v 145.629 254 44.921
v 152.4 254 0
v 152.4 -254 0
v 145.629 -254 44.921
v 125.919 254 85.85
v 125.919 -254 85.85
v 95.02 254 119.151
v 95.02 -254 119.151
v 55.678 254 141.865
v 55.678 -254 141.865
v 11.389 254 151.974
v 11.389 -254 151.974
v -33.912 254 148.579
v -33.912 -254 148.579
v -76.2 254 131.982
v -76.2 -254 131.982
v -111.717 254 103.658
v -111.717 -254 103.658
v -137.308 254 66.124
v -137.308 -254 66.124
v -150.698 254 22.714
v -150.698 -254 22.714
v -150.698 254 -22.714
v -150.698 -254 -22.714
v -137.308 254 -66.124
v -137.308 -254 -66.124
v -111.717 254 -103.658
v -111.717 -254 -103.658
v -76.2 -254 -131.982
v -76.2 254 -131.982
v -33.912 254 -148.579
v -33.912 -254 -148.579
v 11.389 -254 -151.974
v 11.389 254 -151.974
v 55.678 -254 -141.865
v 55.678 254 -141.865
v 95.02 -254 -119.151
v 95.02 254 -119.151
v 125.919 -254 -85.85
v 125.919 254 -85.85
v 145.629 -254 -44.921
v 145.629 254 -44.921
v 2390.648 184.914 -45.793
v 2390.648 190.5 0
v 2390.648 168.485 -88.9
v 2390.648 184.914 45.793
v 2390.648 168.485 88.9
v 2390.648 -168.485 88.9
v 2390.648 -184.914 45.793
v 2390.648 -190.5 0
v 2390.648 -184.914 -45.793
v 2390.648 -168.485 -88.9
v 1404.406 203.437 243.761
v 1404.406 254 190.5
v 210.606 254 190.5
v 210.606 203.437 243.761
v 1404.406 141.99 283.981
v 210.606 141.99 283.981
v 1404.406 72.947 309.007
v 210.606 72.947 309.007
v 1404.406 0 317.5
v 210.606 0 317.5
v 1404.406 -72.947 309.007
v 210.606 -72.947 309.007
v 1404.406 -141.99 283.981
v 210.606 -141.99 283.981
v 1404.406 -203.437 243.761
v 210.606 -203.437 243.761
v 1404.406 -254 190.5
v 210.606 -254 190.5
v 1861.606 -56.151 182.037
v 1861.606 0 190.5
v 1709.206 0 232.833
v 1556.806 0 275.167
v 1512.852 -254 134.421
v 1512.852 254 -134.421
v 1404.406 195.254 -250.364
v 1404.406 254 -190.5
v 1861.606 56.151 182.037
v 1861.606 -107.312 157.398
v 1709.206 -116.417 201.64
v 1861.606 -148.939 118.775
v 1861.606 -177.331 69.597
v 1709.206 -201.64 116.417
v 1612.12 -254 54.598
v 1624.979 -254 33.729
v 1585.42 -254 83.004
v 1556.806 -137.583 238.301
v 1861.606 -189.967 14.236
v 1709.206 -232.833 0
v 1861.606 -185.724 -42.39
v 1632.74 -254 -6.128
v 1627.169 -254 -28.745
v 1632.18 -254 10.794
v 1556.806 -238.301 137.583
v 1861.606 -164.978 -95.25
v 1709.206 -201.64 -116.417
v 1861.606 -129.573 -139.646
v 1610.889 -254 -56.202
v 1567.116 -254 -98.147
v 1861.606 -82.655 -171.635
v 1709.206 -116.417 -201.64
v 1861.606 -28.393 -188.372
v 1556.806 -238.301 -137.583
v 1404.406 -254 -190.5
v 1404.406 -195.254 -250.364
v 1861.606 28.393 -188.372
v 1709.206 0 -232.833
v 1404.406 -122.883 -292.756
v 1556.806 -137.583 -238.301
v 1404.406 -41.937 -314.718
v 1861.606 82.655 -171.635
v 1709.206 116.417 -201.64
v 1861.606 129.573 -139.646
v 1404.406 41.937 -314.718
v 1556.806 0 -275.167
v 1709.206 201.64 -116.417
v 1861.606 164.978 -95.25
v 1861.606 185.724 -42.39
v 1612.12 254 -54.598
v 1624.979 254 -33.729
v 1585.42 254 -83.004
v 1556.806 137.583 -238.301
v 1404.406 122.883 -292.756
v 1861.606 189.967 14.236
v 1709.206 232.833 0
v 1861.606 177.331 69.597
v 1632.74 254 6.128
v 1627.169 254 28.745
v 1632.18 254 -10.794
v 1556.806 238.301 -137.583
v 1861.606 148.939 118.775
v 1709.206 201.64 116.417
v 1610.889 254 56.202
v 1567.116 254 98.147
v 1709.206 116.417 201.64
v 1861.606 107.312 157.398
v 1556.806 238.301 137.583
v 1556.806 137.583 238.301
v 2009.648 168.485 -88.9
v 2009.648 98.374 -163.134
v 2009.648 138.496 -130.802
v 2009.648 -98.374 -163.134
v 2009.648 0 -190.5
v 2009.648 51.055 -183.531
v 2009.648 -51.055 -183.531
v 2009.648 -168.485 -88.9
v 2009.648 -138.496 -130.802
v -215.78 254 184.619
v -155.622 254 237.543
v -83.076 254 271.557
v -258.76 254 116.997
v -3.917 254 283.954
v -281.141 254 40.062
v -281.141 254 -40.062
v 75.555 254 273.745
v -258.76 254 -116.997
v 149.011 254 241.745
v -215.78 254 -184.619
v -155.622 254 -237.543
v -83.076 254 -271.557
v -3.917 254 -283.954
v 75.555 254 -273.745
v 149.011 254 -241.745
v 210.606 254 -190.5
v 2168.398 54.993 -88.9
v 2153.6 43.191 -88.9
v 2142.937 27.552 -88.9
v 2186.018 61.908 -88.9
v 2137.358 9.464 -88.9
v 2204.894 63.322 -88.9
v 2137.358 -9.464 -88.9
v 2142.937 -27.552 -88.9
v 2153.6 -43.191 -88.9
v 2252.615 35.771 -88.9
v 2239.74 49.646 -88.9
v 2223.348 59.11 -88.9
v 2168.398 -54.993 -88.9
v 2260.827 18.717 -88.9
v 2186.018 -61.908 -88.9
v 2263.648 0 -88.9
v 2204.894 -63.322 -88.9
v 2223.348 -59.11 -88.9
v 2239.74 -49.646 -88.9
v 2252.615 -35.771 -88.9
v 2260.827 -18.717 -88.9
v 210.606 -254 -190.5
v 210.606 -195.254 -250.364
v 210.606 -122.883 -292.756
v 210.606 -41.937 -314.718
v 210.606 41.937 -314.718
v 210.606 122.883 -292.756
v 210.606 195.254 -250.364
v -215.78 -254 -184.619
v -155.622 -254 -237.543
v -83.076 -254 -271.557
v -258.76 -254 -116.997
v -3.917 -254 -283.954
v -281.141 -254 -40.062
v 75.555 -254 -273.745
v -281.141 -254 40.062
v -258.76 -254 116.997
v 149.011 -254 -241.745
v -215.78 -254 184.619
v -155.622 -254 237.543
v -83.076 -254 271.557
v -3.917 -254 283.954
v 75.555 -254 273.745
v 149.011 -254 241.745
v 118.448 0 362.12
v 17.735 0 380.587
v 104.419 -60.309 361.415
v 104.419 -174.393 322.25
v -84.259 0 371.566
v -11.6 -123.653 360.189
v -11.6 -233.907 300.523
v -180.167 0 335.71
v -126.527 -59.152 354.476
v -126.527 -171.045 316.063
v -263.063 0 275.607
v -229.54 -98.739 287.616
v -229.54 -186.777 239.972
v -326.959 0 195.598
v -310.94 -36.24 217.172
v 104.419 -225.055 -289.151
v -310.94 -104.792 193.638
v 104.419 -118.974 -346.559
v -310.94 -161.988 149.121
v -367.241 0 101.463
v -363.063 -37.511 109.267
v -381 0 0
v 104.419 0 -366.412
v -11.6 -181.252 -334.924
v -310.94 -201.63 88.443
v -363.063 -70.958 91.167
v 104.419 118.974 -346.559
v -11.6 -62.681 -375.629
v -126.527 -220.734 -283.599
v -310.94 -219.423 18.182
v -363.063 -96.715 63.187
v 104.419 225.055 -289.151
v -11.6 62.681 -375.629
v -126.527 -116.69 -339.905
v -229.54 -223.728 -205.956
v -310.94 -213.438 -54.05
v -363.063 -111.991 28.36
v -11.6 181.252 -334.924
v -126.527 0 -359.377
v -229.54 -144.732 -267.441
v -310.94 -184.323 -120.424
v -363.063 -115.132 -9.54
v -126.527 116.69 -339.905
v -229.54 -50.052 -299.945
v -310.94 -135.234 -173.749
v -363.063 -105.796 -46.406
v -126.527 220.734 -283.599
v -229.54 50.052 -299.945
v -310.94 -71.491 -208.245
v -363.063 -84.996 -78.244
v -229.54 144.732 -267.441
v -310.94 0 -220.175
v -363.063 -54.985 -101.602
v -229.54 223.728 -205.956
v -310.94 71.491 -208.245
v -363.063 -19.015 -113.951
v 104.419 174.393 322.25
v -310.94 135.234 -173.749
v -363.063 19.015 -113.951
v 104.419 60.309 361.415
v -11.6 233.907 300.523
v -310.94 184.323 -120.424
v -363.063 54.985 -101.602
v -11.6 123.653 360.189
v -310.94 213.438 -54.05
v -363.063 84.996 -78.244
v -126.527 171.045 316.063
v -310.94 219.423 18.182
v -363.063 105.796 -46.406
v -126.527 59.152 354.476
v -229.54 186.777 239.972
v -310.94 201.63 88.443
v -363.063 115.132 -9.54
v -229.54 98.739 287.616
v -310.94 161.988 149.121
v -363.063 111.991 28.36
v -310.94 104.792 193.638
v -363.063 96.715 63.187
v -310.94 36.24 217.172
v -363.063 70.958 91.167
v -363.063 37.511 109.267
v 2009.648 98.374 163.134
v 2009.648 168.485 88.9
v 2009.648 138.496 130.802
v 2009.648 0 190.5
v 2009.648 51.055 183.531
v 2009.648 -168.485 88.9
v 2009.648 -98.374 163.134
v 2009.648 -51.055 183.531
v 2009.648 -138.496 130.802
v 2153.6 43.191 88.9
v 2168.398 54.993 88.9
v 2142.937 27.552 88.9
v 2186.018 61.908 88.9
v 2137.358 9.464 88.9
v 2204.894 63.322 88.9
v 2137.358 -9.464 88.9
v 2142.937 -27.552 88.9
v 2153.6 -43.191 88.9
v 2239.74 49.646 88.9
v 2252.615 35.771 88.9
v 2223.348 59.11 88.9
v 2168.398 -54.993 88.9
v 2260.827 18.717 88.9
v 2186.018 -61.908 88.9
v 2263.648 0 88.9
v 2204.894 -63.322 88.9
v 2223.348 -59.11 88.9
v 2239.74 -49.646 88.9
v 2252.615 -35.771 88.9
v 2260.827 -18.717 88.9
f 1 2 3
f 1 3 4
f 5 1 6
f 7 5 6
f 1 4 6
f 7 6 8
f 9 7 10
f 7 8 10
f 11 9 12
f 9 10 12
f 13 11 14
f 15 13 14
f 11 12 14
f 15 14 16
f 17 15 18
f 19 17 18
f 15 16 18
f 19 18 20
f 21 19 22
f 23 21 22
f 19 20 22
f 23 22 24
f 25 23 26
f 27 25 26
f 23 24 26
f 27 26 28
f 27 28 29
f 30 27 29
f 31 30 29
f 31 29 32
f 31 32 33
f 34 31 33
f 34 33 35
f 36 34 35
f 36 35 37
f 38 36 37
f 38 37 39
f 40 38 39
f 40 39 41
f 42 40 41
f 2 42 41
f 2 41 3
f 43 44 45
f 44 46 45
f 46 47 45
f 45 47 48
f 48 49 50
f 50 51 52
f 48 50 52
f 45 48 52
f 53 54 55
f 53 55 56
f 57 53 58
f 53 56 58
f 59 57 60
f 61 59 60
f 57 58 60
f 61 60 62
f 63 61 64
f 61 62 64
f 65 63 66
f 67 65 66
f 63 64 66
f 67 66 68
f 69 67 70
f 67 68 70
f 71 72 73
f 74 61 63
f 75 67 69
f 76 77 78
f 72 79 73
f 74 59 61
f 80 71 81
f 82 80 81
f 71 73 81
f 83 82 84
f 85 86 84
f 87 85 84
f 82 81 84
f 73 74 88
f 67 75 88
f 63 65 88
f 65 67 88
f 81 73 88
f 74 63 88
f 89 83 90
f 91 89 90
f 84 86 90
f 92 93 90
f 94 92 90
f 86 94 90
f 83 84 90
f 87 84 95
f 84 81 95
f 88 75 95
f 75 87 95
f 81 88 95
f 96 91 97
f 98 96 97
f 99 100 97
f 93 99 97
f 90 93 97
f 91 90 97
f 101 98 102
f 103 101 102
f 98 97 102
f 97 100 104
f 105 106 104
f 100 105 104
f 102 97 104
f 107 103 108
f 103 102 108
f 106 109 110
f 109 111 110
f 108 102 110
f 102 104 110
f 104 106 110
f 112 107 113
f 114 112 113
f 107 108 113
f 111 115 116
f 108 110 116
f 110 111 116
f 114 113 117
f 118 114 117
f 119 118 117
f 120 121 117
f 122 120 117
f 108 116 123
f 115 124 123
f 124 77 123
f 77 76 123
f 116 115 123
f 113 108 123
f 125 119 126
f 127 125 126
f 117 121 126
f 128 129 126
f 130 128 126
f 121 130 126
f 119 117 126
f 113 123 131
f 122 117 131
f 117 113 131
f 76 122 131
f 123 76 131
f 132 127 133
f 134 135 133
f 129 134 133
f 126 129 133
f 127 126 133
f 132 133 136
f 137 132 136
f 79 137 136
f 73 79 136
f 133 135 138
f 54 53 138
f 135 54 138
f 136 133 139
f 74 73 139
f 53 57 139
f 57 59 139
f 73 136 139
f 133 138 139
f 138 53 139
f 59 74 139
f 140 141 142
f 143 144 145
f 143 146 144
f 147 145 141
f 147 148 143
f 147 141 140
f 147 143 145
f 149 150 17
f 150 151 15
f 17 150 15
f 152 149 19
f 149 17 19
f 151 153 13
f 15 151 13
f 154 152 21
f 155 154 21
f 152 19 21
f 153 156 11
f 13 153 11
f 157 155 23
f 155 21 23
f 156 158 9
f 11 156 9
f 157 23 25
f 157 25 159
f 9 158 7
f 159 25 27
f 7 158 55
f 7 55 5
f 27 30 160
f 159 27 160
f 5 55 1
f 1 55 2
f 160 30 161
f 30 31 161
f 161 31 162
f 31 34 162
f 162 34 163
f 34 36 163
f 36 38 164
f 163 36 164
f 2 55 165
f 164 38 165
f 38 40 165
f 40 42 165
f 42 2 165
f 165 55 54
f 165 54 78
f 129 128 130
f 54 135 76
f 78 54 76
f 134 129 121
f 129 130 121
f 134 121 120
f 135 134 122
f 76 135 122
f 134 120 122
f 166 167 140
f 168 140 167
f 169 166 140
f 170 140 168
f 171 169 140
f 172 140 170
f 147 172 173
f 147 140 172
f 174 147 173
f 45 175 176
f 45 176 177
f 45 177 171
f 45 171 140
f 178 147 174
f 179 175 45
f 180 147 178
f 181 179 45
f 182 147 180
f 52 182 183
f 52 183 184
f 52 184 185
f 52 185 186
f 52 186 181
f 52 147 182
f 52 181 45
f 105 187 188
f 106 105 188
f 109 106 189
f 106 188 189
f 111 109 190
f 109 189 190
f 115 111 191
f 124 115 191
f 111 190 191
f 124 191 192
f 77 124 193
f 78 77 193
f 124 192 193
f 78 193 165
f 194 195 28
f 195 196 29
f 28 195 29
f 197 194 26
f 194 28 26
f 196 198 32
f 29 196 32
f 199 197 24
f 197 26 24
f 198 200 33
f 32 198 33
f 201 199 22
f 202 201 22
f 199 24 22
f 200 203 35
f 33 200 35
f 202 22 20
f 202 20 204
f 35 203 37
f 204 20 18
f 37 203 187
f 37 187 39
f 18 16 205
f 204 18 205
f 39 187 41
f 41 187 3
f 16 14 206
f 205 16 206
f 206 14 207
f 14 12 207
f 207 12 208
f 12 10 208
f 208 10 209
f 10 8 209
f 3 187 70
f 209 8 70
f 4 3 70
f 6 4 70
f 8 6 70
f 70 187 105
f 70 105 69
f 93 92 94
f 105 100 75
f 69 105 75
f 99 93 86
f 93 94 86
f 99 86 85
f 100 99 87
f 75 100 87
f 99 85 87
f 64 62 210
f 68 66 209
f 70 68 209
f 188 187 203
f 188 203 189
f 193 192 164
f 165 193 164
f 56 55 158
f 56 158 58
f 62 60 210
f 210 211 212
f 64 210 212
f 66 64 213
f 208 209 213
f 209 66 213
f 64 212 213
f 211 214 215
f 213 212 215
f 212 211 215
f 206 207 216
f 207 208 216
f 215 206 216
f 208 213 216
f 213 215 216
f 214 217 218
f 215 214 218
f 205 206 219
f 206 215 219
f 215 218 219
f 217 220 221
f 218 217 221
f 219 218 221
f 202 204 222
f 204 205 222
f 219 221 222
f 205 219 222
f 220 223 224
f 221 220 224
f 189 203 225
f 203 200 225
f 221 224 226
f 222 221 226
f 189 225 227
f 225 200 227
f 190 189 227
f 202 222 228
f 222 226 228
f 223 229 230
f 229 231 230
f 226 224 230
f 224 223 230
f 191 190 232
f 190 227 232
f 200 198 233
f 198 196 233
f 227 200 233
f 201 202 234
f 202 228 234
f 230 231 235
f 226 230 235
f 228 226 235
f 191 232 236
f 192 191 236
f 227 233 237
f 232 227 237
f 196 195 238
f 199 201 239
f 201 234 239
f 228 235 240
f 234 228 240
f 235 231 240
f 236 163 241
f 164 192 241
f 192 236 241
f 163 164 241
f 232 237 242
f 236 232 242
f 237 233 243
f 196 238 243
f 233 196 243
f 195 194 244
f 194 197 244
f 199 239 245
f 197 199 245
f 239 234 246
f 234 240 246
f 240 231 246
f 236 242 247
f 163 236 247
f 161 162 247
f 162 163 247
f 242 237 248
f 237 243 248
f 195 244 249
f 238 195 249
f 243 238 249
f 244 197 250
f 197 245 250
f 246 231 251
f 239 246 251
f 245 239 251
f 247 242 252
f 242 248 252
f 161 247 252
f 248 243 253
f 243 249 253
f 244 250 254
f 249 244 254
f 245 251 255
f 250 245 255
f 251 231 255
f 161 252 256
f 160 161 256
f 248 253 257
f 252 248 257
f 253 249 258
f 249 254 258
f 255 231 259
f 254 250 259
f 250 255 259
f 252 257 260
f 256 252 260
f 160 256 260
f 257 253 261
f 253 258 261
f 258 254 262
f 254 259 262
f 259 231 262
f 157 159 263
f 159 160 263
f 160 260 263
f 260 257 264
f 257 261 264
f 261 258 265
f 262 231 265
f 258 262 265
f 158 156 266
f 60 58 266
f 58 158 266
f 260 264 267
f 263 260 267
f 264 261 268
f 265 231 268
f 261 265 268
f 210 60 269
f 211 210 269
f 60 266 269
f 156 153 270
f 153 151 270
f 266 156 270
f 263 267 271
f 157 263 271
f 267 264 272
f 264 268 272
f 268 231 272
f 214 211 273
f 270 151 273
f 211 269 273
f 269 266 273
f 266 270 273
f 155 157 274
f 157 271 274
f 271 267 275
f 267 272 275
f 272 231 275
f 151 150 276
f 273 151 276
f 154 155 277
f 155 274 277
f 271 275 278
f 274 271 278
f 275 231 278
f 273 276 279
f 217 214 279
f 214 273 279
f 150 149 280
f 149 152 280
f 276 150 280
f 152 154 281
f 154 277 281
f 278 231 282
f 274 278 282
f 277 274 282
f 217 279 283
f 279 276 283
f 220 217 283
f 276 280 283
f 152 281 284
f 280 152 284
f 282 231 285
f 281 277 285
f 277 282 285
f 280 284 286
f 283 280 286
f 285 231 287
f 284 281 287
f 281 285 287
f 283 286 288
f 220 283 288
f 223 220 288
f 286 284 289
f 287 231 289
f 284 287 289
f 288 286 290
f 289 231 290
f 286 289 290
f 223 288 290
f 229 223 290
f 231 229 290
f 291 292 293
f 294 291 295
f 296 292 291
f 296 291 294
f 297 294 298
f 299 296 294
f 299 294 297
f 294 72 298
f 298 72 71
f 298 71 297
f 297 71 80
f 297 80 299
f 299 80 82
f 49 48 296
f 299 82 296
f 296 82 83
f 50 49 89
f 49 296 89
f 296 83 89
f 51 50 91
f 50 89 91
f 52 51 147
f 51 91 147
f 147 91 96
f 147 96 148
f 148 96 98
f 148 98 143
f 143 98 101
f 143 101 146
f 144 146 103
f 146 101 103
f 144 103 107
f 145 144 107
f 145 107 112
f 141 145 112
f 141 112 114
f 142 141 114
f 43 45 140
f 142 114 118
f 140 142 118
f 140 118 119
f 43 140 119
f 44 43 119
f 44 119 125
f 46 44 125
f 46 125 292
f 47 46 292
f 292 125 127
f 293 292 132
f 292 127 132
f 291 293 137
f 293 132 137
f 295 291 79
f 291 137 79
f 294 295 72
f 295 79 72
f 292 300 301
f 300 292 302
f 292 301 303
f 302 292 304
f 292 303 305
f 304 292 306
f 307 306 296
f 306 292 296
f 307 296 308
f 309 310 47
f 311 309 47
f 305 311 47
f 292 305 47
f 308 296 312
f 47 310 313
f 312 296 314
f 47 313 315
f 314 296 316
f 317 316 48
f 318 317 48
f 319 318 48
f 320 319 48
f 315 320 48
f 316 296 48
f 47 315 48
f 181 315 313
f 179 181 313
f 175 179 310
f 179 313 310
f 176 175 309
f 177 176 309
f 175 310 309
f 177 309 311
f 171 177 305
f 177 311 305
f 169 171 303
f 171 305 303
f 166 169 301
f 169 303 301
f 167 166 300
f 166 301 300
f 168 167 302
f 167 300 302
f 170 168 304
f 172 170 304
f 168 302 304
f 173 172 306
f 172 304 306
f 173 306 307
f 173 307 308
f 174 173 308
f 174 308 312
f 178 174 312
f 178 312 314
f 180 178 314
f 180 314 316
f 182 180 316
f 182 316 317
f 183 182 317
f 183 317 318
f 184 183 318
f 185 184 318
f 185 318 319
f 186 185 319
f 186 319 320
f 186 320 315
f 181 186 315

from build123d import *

# Parameters (mm, degrees)
F2_W          = 381
F2_H          = 102.1967058976
F3_DEPTH      = 381.001
F3_DEPTH_BACK = 381.001
F5_DEPTH      = 2771.6493650208
F6_R          = 152.4
F7_DEPTH      = 508.001
F8_R          = 63.5
F9_DEPTH      = 469.901


with BuildPart() as f1:
    # F0 (on Front) → F1 (revolve)
    with BuildSketch(Plane.XZ):
        with BuildLine():
            ThreePointArc((210.6056741876, 317.5), (-180.1669200138, 335.7095186806), (-381, 0))
            Line((-381, 0), (1644.6669101715, 0))
            Line((1644.6669101715, 0), (1709.2056741876, 0))
            Line((1709.2056741876, 0), (2390.6483650208, 0))
            Line((2390.6483650208, 0), (2390.6483650208, 190.5))
            Line((2390.6483650208, 190.5), (1861.6056741876, 190.5))
            Line((1861.6056741876, 190.5), (1404.4056741876, 317.5))
            Line((1404.4056741876, 317.5), (210.6056741876, 317.5))
        make_face()
    revolve(axis=Axis((1529.9751758575, 0, 0), (1, 0, 0)))

    # F2 (on Front) → F3 (cut, two sides)
    with BuildSketch(Plane.XZ) as f3_sk:
        with Locations((2200.1483650208, 139.9983529488)):
            Rectangle(F2_W, F2_H)
        with Locations((2200.1483650208, -139.9983529488)):
            Rectangle(F2_W, F2_H)
    extrude(amount=-F3_DEPTH, mode=Mode.SUBTRACT)
    extrude(f3_sk.sketch, amount=F3_DEPTH_BACK, mode=Mode.SUBTRACT)

    # F4 (on face) → F5 (cut, through all)
    with BuildSketch(Plane.YZ.offset(2390.6483650208)):
        with BuildLine():
            Line((-254, -283.9806331425), (-254, 283.9806331425))
            ThreePointArc((-254, 283.9806331425), (-381, 0), (-254, -283.9806331425))
        make_face()
        with BuildLine():
            ThreePointArc((381, 0), (347.8038240158, 155.5425986667), (254, 283.9806331425))
            Line((254, 283.9806331425), (254, -283.9806331425))
            ThreePointArc((254, -283.9806331425), (347.8038240158, -155.5425986667), (381, 0))
        make_face()
    extrude(amount=-F5_DEPTH, mode=Mode.SUBTRACT)

    # F6 (on face) → F7 (cut, through all)
    with BuildSketch(Plane.XZ.offset(254)):
        Circle(F6_R)
    extrude(amount=-F7_DEPTH, mode=Mode.SUBTRACT)

    # F8 (on face) → F9 (cut, through all)
    with BuildSketch(Plane.XY.offset(88.9)):
        with Locations((2200.1483650208, 0)):
            Circle(F8_R)
    extrude(amount=-F9_DEPTH, mode=Mode.SUBTRACT)


solid = f1.part
